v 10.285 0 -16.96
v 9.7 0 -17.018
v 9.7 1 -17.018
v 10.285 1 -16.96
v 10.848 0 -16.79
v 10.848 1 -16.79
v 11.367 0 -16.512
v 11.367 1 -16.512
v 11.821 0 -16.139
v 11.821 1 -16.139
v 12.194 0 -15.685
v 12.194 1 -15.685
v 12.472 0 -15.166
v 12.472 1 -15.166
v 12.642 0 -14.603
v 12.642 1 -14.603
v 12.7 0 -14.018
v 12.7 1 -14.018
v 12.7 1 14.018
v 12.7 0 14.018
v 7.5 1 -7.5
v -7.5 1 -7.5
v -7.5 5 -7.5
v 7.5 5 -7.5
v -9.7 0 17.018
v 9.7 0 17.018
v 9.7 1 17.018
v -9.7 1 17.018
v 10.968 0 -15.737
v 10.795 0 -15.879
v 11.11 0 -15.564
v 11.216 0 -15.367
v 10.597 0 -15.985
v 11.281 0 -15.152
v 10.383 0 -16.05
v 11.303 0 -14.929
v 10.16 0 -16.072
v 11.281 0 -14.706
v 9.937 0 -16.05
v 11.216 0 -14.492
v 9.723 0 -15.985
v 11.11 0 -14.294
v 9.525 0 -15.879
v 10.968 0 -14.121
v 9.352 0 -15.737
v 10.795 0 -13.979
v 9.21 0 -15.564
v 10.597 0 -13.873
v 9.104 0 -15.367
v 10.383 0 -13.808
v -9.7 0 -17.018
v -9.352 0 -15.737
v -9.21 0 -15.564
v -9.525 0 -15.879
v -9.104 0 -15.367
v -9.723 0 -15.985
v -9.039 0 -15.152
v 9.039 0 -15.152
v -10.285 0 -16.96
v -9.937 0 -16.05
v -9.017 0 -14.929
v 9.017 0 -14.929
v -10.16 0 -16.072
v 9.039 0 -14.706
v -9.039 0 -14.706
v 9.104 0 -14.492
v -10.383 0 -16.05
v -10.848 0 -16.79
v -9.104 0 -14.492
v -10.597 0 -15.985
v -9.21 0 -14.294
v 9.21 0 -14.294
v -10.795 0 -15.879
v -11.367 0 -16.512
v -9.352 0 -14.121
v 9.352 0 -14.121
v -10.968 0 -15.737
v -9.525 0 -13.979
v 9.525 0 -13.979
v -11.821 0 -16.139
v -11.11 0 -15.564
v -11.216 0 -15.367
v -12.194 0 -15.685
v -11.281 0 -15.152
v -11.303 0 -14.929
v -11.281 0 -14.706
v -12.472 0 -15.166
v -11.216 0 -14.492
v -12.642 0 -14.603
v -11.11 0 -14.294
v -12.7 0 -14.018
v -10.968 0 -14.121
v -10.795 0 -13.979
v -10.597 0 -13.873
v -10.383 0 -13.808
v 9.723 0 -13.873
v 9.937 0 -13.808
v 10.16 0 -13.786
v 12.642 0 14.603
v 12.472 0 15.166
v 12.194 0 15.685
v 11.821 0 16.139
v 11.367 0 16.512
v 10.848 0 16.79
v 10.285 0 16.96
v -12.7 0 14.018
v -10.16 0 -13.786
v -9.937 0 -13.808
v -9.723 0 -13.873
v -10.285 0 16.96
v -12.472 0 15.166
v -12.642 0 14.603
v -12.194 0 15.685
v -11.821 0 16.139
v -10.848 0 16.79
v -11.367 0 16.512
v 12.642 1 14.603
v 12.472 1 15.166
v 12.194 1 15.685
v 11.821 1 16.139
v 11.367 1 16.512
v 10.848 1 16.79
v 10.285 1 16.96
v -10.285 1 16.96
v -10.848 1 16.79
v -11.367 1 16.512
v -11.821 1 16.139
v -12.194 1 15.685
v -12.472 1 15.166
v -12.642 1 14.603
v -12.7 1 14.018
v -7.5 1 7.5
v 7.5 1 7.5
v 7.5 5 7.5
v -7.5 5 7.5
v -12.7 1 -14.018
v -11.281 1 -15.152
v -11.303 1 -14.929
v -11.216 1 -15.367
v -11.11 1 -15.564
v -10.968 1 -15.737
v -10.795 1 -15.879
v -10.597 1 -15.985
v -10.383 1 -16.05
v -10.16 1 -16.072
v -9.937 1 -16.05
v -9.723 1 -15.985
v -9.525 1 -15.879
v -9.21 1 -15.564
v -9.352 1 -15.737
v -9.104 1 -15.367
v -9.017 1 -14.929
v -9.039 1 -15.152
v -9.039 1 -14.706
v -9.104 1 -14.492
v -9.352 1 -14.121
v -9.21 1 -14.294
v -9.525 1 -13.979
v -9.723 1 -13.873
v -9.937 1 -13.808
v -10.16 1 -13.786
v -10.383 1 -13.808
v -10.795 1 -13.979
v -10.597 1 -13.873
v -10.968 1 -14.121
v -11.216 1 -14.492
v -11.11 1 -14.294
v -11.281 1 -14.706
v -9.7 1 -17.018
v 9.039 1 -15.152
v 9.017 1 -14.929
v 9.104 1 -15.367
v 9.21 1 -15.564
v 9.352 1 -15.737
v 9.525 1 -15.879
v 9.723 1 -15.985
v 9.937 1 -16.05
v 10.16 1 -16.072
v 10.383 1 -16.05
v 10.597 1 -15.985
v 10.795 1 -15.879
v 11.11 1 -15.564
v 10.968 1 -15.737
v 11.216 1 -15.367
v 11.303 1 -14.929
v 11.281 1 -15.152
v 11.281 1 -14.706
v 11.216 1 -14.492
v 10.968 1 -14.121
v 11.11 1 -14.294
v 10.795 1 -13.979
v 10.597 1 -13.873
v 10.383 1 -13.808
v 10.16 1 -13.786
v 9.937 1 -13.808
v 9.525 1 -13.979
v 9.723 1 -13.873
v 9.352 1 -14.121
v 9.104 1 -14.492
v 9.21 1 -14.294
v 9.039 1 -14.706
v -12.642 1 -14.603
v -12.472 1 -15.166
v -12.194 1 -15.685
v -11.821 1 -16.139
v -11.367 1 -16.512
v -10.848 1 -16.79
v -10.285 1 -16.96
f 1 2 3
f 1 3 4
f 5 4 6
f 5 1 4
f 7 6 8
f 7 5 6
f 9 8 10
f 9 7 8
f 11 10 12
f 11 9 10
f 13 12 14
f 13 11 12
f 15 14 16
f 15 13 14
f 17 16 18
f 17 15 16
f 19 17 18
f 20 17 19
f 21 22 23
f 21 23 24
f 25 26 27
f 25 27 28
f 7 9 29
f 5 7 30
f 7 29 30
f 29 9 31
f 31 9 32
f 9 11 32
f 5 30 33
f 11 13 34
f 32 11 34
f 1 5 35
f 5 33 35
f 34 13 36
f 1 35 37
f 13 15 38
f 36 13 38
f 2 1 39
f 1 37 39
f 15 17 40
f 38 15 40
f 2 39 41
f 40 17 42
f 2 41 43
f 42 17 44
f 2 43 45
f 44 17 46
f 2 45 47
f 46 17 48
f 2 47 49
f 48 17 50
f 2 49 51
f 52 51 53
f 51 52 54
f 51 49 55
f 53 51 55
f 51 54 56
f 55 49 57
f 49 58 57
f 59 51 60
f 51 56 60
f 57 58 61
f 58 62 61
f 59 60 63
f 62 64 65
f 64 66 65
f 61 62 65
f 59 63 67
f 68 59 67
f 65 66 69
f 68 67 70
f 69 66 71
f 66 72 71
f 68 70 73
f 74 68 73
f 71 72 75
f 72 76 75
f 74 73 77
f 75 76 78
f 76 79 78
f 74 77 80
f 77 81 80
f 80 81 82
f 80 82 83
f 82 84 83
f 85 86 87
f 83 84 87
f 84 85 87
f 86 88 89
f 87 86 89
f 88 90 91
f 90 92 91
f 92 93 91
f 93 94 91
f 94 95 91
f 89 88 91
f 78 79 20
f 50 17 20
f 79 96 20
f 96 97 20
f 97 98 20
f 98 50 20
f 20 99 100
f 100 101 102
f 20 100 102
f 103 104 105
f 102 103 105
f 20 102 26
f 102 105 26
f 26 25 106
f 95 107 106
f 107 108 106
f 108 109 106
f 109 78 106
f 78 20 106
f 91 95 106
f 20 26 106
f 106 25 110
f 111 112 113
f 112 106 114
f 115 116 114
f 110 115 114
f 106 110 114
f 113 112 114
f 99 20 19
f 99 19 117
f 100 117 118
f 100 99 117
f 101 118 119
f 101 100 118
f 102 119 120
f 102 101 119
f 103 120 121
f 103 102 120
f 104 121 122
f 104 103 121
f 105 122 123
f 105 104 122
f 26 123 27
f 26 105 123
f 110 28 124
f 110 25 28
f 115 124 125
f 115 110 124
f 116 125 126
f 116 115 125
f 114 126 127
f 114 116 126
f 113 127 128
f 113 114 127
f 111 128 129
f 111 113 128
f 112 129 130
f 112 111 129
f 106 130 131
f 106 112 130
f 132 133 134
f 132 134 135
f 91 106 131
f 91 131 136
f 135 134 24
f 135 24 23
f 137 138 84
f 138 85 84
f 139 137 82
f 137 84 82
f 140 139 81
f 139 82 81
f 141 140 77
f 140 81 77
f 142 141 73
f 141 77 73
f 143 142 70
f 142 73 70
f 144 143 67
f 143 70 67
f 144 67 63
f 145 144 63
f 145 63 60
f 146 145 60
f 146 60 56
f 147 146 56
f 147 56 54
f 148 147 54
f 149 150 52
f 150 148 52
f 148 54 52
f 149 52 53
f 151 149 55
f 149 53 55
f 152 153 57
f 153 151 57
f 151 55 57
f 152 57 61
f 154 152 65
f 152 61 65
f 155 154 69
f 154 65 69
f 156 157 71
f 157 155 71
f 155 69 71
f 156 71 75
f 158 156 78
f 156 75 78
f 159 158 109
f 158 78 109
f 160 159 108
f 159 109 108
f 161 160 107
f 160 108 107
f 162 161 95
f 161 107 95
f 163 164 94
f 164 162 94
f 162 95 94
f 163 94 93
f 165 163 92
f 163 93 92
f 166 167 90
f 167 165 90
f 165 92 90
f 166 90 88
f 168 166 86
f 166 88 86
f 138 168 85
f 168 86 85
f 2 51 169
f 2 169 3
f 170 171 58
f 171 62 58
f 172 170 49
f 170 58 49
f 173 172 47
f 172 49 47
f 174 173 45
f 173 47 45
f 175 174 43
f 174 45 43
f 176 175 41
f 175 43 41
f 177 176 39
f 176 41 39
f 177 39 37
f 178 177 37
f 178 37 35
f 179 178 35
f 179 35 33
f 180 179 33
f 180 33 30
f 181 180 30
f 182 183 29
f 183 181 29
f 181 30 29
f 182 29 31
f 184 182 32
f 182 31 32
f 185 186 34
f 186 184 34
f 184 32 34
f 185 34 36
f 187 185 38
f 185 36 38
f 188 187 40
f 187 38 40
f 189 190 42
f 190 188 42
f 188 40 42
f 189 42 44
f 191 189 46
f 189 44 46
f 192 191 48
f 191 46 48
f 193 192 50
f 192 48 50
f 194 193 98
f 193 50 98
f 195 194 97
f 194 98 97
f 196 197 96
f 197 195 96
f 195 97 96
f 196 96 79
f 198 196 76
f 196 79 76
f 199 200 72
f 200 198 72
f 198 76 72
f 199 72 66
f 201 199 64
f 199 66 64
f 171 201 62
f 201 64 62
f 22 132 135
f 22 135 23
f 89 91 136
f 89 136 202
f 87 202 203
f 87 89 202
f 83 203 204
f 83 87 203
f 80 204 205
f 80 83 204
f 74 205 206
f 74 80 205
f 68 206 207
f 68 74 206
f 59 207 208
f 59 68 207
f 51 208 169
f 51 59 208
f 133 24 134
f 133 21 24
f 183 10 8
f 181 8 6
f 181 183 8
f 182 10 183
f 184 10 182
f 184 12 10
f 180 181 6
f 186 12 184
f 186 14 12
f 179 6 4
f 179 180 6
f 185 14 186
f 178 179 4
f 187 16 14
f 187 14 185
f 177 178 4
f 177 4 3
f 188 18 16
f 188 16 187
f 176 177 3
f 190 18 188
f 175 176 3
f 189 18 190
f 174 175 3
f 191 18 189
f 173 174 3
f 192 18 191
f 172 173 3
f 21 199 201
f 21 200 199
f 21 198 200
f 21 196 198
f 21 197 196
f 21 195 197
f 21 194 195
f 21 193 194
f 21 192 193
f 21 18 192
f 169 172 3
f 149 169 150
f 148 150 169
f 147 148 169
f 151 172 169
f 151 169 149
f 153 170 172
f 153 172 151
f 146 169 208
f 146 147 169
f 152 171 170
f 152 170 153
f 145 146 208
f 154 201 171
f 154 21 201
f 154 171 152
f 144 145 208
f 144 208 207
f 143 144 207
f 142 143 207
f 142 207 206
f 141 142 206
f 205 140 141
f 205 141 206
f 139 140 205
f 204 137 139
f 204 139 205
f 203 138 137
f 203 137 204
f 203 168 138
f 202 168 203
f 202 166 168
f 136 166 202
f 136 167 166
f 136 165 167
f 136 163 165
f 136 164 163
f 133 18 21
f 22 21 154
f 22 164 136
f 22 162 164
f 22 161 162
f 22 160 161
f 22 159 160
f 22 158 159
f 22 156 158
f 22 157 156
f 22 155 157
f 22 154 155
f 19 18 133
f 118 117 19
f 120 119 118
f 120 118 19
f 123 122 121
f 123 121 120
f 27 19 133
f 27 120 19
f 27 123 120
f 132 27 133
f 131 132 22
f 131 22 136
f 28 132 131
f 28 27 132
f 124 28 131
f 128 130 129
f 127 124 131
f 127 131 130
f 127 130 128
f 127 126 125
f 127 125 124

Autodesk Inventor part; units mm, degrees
ref_plane "YZ Plane" through (0, 0, 0) normal (1, 0, 0) x (0, 1, 0)
ref_plane "XZ Plane" through (0, 0, 0) normal (0, 1, 0) x (-1, 0, 0)
ref_plane "XY Plane" through (0, 0, 0) normal (0, 0, 1) x (1, 0, 0)
sketch "Skizze1" plane through (0, 0, 0) normal (0, 1, 0) x (-1, 0, 0)
  line L0 (9.7, -17.018) -> (-9.7, -17.018)
  line L1 (-12.7, -14.018) -> (-12.7, 14.018)
  line L2 (-9.7, 17.018) -> (9.7, 17.018)
  line L3 (12.7, 14.018) -> (12.7, -14.018)
  line L4 (0, -24.695) -> (0, 24.695) projected
  line L5 (18.6498, 0) -> (-18.6498, 0) projected
  circle A0 centre (10.16, -14.9291) radius 1.143
  circle A1 centre (-10.16, -14.9291) radius 1.143
  arc A2 (9.7, -17.018) -> (12.7, -14.018) centre (9.7, -14.018) ccw
  arc A3 (-12.7, -14.018) -> (-9.7, -17.018) centre (-9.7, -14.018) ccw
  arc A4 (12.7, 14.018) -> (9.7, 17.018) centre (9.7, 14.018) ccw
  arc A5 (-9.7, 17.018) -> (-12.7, 14.018) centre (-9.7, 14.018) ccw
  line L6 (7.5, -7.5) -> (-7.5, -7.5)
  line L7 (-7.5, -7.5) -> (-7.5, 7.5)
  line L8 (-7.5, 7.5) -> (7.5, 7.5)
  line L9 (7.5, 7.5) -> (7.5, -7.5)
  point P0 (0, 0)
  dimension "d0" = 25.4
  dimension "d1" = 34.036
  dimension "d2" = 2.286
  dimension "d3" = 2.286
  dimension "d4" = 20.32
  dimension "d5" = 3
  dimension "d6" = 3
  dimension "d7" = 3
  dimension "d8" = 3
  dimension "d9" = 15
  dimension "d10" = 15
extrude "Extrusion1" add sketch "Skizze1" along normal blind 1
extrude "Extrusion2" add sketch "Skizze1" along normal blind 5 contours L6 L7 L5 L4 | L4 L5 L9 L6 | L5 L7 L8 L4 | L4 L8 L9 L5
properties part number "GPSSensor"
